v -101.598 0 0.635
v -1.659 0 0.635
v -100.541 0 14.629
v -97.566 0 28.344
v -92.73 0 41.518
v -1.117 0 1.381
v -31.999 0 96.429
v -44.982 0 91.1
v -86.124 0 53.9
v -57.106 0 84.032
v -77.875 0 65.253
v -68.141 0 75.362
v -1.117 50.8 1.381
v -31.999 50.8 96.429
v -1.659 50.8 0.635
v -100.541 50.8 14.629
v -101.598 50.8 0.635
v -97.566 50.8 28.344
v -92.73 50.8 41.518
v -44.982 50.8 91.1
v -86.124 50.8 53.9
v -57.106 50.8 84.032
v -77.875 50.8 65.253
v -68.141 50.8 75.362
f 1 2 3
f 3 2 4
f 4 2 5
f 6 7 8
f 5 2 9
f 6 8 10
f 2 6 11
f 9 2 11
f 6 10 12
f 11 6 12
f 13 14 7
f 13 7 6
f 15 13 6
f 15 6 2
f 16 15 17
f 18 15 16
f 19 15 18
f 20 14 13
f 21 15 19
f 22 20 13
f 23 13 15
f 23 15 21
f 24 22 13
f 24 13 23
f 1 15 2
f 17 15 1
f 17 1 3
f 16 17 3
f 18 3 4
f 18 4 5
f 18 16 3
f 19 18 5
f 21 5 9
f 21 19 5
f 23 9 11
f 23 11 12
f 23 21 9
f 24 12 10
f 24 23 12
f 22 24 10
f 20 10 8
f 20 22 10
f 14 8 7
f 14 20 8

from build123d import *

# Parameters (mm, degrees)
SKETCH1_W          = 101.6
SKETCH1_H          = 50.8
REVOLVE1_ANGLE     = 72
SKETCH2_W          = 101.6
SKETCH2_H          = 50.8
CUT_EXTRUDE1_DEPTH = 0.635
SKETCH3_W          = 100.932321488
SKETCH3_H          = 50.8
CUT_EXTRUDE2_DEPTH = 0.635
CUT_EXTRUDE3_REACH = 151.001


with BuildPart() as part:
    # Sketch1 → Revolve1 (revolve)
    with BuildSketch(Plane.XY):
        with Locations((-50.8, 25.4)):
            Rectangle(SKETCH1_W, SKETCH1_H)
    revolve(axis=Axis((0, 0, 0), (0, 1, 0)), revolution_arc=REVOLVE1_ANGLE)

    # Sketch2 → Cut-Extrude1 (cut)
    with BuildSketch(Plane(origin=(0, 0, 0), x_dir=(0.3090169943749449, 0, -0.9510565162951544), z_dir=(0.9510565162951544, 0, 0.3090169943749449))):
        with Locations((-50.8, 25.4)):
            Rectangle(SKETCH2_W, SKETCH2_H)
    extrude(amount=-CUT_EXTRUDE1_DEPTH, mode=Mode.SUBTRACT)

    # Sketch3 → Cut-Extrude2 (cut)
    with BuildSketch(Plane(origin=(0, 0, 0), x_dir=(-1, 0, 0), z_dir=(0, 0, -1))):
        with Locations((51.133839256, 25.4)):
            Rectangle(SKETCH3_W, SKETCH3_H)
    extrude(amount=-CUT_EXTRUDE2_DEPTH, mode=Mode.SUBTRACT)

    # Sketch4 → Cut-Extrude3 (cut, up to next)
    with BuildSketch(Plane(origin=(0, 50.8, 0), x_dir=(1, 0, 0), z_dir=(0, 1, 0)), mode=Mode.PRIVATE) as cut_extrude3_sk1:
        Polygon((-1.116550937, -1.38148727), (-1.658905685, -0.635), (-0.874002519, -0.635), align=None)
    cut_extrude3_tool1 = extrude(cut_extrude3_sk1.sketch, amount=-CUT_EXTRUDE3_REACH, mode=Mode.PRIVATE) & part.part
    add(cut_extrude3_tool1.solids().sort_by_distance((-1.216486, 50.8, 0.883829))[0], mode=Mode.SUBTRACT)


solid = part.part
